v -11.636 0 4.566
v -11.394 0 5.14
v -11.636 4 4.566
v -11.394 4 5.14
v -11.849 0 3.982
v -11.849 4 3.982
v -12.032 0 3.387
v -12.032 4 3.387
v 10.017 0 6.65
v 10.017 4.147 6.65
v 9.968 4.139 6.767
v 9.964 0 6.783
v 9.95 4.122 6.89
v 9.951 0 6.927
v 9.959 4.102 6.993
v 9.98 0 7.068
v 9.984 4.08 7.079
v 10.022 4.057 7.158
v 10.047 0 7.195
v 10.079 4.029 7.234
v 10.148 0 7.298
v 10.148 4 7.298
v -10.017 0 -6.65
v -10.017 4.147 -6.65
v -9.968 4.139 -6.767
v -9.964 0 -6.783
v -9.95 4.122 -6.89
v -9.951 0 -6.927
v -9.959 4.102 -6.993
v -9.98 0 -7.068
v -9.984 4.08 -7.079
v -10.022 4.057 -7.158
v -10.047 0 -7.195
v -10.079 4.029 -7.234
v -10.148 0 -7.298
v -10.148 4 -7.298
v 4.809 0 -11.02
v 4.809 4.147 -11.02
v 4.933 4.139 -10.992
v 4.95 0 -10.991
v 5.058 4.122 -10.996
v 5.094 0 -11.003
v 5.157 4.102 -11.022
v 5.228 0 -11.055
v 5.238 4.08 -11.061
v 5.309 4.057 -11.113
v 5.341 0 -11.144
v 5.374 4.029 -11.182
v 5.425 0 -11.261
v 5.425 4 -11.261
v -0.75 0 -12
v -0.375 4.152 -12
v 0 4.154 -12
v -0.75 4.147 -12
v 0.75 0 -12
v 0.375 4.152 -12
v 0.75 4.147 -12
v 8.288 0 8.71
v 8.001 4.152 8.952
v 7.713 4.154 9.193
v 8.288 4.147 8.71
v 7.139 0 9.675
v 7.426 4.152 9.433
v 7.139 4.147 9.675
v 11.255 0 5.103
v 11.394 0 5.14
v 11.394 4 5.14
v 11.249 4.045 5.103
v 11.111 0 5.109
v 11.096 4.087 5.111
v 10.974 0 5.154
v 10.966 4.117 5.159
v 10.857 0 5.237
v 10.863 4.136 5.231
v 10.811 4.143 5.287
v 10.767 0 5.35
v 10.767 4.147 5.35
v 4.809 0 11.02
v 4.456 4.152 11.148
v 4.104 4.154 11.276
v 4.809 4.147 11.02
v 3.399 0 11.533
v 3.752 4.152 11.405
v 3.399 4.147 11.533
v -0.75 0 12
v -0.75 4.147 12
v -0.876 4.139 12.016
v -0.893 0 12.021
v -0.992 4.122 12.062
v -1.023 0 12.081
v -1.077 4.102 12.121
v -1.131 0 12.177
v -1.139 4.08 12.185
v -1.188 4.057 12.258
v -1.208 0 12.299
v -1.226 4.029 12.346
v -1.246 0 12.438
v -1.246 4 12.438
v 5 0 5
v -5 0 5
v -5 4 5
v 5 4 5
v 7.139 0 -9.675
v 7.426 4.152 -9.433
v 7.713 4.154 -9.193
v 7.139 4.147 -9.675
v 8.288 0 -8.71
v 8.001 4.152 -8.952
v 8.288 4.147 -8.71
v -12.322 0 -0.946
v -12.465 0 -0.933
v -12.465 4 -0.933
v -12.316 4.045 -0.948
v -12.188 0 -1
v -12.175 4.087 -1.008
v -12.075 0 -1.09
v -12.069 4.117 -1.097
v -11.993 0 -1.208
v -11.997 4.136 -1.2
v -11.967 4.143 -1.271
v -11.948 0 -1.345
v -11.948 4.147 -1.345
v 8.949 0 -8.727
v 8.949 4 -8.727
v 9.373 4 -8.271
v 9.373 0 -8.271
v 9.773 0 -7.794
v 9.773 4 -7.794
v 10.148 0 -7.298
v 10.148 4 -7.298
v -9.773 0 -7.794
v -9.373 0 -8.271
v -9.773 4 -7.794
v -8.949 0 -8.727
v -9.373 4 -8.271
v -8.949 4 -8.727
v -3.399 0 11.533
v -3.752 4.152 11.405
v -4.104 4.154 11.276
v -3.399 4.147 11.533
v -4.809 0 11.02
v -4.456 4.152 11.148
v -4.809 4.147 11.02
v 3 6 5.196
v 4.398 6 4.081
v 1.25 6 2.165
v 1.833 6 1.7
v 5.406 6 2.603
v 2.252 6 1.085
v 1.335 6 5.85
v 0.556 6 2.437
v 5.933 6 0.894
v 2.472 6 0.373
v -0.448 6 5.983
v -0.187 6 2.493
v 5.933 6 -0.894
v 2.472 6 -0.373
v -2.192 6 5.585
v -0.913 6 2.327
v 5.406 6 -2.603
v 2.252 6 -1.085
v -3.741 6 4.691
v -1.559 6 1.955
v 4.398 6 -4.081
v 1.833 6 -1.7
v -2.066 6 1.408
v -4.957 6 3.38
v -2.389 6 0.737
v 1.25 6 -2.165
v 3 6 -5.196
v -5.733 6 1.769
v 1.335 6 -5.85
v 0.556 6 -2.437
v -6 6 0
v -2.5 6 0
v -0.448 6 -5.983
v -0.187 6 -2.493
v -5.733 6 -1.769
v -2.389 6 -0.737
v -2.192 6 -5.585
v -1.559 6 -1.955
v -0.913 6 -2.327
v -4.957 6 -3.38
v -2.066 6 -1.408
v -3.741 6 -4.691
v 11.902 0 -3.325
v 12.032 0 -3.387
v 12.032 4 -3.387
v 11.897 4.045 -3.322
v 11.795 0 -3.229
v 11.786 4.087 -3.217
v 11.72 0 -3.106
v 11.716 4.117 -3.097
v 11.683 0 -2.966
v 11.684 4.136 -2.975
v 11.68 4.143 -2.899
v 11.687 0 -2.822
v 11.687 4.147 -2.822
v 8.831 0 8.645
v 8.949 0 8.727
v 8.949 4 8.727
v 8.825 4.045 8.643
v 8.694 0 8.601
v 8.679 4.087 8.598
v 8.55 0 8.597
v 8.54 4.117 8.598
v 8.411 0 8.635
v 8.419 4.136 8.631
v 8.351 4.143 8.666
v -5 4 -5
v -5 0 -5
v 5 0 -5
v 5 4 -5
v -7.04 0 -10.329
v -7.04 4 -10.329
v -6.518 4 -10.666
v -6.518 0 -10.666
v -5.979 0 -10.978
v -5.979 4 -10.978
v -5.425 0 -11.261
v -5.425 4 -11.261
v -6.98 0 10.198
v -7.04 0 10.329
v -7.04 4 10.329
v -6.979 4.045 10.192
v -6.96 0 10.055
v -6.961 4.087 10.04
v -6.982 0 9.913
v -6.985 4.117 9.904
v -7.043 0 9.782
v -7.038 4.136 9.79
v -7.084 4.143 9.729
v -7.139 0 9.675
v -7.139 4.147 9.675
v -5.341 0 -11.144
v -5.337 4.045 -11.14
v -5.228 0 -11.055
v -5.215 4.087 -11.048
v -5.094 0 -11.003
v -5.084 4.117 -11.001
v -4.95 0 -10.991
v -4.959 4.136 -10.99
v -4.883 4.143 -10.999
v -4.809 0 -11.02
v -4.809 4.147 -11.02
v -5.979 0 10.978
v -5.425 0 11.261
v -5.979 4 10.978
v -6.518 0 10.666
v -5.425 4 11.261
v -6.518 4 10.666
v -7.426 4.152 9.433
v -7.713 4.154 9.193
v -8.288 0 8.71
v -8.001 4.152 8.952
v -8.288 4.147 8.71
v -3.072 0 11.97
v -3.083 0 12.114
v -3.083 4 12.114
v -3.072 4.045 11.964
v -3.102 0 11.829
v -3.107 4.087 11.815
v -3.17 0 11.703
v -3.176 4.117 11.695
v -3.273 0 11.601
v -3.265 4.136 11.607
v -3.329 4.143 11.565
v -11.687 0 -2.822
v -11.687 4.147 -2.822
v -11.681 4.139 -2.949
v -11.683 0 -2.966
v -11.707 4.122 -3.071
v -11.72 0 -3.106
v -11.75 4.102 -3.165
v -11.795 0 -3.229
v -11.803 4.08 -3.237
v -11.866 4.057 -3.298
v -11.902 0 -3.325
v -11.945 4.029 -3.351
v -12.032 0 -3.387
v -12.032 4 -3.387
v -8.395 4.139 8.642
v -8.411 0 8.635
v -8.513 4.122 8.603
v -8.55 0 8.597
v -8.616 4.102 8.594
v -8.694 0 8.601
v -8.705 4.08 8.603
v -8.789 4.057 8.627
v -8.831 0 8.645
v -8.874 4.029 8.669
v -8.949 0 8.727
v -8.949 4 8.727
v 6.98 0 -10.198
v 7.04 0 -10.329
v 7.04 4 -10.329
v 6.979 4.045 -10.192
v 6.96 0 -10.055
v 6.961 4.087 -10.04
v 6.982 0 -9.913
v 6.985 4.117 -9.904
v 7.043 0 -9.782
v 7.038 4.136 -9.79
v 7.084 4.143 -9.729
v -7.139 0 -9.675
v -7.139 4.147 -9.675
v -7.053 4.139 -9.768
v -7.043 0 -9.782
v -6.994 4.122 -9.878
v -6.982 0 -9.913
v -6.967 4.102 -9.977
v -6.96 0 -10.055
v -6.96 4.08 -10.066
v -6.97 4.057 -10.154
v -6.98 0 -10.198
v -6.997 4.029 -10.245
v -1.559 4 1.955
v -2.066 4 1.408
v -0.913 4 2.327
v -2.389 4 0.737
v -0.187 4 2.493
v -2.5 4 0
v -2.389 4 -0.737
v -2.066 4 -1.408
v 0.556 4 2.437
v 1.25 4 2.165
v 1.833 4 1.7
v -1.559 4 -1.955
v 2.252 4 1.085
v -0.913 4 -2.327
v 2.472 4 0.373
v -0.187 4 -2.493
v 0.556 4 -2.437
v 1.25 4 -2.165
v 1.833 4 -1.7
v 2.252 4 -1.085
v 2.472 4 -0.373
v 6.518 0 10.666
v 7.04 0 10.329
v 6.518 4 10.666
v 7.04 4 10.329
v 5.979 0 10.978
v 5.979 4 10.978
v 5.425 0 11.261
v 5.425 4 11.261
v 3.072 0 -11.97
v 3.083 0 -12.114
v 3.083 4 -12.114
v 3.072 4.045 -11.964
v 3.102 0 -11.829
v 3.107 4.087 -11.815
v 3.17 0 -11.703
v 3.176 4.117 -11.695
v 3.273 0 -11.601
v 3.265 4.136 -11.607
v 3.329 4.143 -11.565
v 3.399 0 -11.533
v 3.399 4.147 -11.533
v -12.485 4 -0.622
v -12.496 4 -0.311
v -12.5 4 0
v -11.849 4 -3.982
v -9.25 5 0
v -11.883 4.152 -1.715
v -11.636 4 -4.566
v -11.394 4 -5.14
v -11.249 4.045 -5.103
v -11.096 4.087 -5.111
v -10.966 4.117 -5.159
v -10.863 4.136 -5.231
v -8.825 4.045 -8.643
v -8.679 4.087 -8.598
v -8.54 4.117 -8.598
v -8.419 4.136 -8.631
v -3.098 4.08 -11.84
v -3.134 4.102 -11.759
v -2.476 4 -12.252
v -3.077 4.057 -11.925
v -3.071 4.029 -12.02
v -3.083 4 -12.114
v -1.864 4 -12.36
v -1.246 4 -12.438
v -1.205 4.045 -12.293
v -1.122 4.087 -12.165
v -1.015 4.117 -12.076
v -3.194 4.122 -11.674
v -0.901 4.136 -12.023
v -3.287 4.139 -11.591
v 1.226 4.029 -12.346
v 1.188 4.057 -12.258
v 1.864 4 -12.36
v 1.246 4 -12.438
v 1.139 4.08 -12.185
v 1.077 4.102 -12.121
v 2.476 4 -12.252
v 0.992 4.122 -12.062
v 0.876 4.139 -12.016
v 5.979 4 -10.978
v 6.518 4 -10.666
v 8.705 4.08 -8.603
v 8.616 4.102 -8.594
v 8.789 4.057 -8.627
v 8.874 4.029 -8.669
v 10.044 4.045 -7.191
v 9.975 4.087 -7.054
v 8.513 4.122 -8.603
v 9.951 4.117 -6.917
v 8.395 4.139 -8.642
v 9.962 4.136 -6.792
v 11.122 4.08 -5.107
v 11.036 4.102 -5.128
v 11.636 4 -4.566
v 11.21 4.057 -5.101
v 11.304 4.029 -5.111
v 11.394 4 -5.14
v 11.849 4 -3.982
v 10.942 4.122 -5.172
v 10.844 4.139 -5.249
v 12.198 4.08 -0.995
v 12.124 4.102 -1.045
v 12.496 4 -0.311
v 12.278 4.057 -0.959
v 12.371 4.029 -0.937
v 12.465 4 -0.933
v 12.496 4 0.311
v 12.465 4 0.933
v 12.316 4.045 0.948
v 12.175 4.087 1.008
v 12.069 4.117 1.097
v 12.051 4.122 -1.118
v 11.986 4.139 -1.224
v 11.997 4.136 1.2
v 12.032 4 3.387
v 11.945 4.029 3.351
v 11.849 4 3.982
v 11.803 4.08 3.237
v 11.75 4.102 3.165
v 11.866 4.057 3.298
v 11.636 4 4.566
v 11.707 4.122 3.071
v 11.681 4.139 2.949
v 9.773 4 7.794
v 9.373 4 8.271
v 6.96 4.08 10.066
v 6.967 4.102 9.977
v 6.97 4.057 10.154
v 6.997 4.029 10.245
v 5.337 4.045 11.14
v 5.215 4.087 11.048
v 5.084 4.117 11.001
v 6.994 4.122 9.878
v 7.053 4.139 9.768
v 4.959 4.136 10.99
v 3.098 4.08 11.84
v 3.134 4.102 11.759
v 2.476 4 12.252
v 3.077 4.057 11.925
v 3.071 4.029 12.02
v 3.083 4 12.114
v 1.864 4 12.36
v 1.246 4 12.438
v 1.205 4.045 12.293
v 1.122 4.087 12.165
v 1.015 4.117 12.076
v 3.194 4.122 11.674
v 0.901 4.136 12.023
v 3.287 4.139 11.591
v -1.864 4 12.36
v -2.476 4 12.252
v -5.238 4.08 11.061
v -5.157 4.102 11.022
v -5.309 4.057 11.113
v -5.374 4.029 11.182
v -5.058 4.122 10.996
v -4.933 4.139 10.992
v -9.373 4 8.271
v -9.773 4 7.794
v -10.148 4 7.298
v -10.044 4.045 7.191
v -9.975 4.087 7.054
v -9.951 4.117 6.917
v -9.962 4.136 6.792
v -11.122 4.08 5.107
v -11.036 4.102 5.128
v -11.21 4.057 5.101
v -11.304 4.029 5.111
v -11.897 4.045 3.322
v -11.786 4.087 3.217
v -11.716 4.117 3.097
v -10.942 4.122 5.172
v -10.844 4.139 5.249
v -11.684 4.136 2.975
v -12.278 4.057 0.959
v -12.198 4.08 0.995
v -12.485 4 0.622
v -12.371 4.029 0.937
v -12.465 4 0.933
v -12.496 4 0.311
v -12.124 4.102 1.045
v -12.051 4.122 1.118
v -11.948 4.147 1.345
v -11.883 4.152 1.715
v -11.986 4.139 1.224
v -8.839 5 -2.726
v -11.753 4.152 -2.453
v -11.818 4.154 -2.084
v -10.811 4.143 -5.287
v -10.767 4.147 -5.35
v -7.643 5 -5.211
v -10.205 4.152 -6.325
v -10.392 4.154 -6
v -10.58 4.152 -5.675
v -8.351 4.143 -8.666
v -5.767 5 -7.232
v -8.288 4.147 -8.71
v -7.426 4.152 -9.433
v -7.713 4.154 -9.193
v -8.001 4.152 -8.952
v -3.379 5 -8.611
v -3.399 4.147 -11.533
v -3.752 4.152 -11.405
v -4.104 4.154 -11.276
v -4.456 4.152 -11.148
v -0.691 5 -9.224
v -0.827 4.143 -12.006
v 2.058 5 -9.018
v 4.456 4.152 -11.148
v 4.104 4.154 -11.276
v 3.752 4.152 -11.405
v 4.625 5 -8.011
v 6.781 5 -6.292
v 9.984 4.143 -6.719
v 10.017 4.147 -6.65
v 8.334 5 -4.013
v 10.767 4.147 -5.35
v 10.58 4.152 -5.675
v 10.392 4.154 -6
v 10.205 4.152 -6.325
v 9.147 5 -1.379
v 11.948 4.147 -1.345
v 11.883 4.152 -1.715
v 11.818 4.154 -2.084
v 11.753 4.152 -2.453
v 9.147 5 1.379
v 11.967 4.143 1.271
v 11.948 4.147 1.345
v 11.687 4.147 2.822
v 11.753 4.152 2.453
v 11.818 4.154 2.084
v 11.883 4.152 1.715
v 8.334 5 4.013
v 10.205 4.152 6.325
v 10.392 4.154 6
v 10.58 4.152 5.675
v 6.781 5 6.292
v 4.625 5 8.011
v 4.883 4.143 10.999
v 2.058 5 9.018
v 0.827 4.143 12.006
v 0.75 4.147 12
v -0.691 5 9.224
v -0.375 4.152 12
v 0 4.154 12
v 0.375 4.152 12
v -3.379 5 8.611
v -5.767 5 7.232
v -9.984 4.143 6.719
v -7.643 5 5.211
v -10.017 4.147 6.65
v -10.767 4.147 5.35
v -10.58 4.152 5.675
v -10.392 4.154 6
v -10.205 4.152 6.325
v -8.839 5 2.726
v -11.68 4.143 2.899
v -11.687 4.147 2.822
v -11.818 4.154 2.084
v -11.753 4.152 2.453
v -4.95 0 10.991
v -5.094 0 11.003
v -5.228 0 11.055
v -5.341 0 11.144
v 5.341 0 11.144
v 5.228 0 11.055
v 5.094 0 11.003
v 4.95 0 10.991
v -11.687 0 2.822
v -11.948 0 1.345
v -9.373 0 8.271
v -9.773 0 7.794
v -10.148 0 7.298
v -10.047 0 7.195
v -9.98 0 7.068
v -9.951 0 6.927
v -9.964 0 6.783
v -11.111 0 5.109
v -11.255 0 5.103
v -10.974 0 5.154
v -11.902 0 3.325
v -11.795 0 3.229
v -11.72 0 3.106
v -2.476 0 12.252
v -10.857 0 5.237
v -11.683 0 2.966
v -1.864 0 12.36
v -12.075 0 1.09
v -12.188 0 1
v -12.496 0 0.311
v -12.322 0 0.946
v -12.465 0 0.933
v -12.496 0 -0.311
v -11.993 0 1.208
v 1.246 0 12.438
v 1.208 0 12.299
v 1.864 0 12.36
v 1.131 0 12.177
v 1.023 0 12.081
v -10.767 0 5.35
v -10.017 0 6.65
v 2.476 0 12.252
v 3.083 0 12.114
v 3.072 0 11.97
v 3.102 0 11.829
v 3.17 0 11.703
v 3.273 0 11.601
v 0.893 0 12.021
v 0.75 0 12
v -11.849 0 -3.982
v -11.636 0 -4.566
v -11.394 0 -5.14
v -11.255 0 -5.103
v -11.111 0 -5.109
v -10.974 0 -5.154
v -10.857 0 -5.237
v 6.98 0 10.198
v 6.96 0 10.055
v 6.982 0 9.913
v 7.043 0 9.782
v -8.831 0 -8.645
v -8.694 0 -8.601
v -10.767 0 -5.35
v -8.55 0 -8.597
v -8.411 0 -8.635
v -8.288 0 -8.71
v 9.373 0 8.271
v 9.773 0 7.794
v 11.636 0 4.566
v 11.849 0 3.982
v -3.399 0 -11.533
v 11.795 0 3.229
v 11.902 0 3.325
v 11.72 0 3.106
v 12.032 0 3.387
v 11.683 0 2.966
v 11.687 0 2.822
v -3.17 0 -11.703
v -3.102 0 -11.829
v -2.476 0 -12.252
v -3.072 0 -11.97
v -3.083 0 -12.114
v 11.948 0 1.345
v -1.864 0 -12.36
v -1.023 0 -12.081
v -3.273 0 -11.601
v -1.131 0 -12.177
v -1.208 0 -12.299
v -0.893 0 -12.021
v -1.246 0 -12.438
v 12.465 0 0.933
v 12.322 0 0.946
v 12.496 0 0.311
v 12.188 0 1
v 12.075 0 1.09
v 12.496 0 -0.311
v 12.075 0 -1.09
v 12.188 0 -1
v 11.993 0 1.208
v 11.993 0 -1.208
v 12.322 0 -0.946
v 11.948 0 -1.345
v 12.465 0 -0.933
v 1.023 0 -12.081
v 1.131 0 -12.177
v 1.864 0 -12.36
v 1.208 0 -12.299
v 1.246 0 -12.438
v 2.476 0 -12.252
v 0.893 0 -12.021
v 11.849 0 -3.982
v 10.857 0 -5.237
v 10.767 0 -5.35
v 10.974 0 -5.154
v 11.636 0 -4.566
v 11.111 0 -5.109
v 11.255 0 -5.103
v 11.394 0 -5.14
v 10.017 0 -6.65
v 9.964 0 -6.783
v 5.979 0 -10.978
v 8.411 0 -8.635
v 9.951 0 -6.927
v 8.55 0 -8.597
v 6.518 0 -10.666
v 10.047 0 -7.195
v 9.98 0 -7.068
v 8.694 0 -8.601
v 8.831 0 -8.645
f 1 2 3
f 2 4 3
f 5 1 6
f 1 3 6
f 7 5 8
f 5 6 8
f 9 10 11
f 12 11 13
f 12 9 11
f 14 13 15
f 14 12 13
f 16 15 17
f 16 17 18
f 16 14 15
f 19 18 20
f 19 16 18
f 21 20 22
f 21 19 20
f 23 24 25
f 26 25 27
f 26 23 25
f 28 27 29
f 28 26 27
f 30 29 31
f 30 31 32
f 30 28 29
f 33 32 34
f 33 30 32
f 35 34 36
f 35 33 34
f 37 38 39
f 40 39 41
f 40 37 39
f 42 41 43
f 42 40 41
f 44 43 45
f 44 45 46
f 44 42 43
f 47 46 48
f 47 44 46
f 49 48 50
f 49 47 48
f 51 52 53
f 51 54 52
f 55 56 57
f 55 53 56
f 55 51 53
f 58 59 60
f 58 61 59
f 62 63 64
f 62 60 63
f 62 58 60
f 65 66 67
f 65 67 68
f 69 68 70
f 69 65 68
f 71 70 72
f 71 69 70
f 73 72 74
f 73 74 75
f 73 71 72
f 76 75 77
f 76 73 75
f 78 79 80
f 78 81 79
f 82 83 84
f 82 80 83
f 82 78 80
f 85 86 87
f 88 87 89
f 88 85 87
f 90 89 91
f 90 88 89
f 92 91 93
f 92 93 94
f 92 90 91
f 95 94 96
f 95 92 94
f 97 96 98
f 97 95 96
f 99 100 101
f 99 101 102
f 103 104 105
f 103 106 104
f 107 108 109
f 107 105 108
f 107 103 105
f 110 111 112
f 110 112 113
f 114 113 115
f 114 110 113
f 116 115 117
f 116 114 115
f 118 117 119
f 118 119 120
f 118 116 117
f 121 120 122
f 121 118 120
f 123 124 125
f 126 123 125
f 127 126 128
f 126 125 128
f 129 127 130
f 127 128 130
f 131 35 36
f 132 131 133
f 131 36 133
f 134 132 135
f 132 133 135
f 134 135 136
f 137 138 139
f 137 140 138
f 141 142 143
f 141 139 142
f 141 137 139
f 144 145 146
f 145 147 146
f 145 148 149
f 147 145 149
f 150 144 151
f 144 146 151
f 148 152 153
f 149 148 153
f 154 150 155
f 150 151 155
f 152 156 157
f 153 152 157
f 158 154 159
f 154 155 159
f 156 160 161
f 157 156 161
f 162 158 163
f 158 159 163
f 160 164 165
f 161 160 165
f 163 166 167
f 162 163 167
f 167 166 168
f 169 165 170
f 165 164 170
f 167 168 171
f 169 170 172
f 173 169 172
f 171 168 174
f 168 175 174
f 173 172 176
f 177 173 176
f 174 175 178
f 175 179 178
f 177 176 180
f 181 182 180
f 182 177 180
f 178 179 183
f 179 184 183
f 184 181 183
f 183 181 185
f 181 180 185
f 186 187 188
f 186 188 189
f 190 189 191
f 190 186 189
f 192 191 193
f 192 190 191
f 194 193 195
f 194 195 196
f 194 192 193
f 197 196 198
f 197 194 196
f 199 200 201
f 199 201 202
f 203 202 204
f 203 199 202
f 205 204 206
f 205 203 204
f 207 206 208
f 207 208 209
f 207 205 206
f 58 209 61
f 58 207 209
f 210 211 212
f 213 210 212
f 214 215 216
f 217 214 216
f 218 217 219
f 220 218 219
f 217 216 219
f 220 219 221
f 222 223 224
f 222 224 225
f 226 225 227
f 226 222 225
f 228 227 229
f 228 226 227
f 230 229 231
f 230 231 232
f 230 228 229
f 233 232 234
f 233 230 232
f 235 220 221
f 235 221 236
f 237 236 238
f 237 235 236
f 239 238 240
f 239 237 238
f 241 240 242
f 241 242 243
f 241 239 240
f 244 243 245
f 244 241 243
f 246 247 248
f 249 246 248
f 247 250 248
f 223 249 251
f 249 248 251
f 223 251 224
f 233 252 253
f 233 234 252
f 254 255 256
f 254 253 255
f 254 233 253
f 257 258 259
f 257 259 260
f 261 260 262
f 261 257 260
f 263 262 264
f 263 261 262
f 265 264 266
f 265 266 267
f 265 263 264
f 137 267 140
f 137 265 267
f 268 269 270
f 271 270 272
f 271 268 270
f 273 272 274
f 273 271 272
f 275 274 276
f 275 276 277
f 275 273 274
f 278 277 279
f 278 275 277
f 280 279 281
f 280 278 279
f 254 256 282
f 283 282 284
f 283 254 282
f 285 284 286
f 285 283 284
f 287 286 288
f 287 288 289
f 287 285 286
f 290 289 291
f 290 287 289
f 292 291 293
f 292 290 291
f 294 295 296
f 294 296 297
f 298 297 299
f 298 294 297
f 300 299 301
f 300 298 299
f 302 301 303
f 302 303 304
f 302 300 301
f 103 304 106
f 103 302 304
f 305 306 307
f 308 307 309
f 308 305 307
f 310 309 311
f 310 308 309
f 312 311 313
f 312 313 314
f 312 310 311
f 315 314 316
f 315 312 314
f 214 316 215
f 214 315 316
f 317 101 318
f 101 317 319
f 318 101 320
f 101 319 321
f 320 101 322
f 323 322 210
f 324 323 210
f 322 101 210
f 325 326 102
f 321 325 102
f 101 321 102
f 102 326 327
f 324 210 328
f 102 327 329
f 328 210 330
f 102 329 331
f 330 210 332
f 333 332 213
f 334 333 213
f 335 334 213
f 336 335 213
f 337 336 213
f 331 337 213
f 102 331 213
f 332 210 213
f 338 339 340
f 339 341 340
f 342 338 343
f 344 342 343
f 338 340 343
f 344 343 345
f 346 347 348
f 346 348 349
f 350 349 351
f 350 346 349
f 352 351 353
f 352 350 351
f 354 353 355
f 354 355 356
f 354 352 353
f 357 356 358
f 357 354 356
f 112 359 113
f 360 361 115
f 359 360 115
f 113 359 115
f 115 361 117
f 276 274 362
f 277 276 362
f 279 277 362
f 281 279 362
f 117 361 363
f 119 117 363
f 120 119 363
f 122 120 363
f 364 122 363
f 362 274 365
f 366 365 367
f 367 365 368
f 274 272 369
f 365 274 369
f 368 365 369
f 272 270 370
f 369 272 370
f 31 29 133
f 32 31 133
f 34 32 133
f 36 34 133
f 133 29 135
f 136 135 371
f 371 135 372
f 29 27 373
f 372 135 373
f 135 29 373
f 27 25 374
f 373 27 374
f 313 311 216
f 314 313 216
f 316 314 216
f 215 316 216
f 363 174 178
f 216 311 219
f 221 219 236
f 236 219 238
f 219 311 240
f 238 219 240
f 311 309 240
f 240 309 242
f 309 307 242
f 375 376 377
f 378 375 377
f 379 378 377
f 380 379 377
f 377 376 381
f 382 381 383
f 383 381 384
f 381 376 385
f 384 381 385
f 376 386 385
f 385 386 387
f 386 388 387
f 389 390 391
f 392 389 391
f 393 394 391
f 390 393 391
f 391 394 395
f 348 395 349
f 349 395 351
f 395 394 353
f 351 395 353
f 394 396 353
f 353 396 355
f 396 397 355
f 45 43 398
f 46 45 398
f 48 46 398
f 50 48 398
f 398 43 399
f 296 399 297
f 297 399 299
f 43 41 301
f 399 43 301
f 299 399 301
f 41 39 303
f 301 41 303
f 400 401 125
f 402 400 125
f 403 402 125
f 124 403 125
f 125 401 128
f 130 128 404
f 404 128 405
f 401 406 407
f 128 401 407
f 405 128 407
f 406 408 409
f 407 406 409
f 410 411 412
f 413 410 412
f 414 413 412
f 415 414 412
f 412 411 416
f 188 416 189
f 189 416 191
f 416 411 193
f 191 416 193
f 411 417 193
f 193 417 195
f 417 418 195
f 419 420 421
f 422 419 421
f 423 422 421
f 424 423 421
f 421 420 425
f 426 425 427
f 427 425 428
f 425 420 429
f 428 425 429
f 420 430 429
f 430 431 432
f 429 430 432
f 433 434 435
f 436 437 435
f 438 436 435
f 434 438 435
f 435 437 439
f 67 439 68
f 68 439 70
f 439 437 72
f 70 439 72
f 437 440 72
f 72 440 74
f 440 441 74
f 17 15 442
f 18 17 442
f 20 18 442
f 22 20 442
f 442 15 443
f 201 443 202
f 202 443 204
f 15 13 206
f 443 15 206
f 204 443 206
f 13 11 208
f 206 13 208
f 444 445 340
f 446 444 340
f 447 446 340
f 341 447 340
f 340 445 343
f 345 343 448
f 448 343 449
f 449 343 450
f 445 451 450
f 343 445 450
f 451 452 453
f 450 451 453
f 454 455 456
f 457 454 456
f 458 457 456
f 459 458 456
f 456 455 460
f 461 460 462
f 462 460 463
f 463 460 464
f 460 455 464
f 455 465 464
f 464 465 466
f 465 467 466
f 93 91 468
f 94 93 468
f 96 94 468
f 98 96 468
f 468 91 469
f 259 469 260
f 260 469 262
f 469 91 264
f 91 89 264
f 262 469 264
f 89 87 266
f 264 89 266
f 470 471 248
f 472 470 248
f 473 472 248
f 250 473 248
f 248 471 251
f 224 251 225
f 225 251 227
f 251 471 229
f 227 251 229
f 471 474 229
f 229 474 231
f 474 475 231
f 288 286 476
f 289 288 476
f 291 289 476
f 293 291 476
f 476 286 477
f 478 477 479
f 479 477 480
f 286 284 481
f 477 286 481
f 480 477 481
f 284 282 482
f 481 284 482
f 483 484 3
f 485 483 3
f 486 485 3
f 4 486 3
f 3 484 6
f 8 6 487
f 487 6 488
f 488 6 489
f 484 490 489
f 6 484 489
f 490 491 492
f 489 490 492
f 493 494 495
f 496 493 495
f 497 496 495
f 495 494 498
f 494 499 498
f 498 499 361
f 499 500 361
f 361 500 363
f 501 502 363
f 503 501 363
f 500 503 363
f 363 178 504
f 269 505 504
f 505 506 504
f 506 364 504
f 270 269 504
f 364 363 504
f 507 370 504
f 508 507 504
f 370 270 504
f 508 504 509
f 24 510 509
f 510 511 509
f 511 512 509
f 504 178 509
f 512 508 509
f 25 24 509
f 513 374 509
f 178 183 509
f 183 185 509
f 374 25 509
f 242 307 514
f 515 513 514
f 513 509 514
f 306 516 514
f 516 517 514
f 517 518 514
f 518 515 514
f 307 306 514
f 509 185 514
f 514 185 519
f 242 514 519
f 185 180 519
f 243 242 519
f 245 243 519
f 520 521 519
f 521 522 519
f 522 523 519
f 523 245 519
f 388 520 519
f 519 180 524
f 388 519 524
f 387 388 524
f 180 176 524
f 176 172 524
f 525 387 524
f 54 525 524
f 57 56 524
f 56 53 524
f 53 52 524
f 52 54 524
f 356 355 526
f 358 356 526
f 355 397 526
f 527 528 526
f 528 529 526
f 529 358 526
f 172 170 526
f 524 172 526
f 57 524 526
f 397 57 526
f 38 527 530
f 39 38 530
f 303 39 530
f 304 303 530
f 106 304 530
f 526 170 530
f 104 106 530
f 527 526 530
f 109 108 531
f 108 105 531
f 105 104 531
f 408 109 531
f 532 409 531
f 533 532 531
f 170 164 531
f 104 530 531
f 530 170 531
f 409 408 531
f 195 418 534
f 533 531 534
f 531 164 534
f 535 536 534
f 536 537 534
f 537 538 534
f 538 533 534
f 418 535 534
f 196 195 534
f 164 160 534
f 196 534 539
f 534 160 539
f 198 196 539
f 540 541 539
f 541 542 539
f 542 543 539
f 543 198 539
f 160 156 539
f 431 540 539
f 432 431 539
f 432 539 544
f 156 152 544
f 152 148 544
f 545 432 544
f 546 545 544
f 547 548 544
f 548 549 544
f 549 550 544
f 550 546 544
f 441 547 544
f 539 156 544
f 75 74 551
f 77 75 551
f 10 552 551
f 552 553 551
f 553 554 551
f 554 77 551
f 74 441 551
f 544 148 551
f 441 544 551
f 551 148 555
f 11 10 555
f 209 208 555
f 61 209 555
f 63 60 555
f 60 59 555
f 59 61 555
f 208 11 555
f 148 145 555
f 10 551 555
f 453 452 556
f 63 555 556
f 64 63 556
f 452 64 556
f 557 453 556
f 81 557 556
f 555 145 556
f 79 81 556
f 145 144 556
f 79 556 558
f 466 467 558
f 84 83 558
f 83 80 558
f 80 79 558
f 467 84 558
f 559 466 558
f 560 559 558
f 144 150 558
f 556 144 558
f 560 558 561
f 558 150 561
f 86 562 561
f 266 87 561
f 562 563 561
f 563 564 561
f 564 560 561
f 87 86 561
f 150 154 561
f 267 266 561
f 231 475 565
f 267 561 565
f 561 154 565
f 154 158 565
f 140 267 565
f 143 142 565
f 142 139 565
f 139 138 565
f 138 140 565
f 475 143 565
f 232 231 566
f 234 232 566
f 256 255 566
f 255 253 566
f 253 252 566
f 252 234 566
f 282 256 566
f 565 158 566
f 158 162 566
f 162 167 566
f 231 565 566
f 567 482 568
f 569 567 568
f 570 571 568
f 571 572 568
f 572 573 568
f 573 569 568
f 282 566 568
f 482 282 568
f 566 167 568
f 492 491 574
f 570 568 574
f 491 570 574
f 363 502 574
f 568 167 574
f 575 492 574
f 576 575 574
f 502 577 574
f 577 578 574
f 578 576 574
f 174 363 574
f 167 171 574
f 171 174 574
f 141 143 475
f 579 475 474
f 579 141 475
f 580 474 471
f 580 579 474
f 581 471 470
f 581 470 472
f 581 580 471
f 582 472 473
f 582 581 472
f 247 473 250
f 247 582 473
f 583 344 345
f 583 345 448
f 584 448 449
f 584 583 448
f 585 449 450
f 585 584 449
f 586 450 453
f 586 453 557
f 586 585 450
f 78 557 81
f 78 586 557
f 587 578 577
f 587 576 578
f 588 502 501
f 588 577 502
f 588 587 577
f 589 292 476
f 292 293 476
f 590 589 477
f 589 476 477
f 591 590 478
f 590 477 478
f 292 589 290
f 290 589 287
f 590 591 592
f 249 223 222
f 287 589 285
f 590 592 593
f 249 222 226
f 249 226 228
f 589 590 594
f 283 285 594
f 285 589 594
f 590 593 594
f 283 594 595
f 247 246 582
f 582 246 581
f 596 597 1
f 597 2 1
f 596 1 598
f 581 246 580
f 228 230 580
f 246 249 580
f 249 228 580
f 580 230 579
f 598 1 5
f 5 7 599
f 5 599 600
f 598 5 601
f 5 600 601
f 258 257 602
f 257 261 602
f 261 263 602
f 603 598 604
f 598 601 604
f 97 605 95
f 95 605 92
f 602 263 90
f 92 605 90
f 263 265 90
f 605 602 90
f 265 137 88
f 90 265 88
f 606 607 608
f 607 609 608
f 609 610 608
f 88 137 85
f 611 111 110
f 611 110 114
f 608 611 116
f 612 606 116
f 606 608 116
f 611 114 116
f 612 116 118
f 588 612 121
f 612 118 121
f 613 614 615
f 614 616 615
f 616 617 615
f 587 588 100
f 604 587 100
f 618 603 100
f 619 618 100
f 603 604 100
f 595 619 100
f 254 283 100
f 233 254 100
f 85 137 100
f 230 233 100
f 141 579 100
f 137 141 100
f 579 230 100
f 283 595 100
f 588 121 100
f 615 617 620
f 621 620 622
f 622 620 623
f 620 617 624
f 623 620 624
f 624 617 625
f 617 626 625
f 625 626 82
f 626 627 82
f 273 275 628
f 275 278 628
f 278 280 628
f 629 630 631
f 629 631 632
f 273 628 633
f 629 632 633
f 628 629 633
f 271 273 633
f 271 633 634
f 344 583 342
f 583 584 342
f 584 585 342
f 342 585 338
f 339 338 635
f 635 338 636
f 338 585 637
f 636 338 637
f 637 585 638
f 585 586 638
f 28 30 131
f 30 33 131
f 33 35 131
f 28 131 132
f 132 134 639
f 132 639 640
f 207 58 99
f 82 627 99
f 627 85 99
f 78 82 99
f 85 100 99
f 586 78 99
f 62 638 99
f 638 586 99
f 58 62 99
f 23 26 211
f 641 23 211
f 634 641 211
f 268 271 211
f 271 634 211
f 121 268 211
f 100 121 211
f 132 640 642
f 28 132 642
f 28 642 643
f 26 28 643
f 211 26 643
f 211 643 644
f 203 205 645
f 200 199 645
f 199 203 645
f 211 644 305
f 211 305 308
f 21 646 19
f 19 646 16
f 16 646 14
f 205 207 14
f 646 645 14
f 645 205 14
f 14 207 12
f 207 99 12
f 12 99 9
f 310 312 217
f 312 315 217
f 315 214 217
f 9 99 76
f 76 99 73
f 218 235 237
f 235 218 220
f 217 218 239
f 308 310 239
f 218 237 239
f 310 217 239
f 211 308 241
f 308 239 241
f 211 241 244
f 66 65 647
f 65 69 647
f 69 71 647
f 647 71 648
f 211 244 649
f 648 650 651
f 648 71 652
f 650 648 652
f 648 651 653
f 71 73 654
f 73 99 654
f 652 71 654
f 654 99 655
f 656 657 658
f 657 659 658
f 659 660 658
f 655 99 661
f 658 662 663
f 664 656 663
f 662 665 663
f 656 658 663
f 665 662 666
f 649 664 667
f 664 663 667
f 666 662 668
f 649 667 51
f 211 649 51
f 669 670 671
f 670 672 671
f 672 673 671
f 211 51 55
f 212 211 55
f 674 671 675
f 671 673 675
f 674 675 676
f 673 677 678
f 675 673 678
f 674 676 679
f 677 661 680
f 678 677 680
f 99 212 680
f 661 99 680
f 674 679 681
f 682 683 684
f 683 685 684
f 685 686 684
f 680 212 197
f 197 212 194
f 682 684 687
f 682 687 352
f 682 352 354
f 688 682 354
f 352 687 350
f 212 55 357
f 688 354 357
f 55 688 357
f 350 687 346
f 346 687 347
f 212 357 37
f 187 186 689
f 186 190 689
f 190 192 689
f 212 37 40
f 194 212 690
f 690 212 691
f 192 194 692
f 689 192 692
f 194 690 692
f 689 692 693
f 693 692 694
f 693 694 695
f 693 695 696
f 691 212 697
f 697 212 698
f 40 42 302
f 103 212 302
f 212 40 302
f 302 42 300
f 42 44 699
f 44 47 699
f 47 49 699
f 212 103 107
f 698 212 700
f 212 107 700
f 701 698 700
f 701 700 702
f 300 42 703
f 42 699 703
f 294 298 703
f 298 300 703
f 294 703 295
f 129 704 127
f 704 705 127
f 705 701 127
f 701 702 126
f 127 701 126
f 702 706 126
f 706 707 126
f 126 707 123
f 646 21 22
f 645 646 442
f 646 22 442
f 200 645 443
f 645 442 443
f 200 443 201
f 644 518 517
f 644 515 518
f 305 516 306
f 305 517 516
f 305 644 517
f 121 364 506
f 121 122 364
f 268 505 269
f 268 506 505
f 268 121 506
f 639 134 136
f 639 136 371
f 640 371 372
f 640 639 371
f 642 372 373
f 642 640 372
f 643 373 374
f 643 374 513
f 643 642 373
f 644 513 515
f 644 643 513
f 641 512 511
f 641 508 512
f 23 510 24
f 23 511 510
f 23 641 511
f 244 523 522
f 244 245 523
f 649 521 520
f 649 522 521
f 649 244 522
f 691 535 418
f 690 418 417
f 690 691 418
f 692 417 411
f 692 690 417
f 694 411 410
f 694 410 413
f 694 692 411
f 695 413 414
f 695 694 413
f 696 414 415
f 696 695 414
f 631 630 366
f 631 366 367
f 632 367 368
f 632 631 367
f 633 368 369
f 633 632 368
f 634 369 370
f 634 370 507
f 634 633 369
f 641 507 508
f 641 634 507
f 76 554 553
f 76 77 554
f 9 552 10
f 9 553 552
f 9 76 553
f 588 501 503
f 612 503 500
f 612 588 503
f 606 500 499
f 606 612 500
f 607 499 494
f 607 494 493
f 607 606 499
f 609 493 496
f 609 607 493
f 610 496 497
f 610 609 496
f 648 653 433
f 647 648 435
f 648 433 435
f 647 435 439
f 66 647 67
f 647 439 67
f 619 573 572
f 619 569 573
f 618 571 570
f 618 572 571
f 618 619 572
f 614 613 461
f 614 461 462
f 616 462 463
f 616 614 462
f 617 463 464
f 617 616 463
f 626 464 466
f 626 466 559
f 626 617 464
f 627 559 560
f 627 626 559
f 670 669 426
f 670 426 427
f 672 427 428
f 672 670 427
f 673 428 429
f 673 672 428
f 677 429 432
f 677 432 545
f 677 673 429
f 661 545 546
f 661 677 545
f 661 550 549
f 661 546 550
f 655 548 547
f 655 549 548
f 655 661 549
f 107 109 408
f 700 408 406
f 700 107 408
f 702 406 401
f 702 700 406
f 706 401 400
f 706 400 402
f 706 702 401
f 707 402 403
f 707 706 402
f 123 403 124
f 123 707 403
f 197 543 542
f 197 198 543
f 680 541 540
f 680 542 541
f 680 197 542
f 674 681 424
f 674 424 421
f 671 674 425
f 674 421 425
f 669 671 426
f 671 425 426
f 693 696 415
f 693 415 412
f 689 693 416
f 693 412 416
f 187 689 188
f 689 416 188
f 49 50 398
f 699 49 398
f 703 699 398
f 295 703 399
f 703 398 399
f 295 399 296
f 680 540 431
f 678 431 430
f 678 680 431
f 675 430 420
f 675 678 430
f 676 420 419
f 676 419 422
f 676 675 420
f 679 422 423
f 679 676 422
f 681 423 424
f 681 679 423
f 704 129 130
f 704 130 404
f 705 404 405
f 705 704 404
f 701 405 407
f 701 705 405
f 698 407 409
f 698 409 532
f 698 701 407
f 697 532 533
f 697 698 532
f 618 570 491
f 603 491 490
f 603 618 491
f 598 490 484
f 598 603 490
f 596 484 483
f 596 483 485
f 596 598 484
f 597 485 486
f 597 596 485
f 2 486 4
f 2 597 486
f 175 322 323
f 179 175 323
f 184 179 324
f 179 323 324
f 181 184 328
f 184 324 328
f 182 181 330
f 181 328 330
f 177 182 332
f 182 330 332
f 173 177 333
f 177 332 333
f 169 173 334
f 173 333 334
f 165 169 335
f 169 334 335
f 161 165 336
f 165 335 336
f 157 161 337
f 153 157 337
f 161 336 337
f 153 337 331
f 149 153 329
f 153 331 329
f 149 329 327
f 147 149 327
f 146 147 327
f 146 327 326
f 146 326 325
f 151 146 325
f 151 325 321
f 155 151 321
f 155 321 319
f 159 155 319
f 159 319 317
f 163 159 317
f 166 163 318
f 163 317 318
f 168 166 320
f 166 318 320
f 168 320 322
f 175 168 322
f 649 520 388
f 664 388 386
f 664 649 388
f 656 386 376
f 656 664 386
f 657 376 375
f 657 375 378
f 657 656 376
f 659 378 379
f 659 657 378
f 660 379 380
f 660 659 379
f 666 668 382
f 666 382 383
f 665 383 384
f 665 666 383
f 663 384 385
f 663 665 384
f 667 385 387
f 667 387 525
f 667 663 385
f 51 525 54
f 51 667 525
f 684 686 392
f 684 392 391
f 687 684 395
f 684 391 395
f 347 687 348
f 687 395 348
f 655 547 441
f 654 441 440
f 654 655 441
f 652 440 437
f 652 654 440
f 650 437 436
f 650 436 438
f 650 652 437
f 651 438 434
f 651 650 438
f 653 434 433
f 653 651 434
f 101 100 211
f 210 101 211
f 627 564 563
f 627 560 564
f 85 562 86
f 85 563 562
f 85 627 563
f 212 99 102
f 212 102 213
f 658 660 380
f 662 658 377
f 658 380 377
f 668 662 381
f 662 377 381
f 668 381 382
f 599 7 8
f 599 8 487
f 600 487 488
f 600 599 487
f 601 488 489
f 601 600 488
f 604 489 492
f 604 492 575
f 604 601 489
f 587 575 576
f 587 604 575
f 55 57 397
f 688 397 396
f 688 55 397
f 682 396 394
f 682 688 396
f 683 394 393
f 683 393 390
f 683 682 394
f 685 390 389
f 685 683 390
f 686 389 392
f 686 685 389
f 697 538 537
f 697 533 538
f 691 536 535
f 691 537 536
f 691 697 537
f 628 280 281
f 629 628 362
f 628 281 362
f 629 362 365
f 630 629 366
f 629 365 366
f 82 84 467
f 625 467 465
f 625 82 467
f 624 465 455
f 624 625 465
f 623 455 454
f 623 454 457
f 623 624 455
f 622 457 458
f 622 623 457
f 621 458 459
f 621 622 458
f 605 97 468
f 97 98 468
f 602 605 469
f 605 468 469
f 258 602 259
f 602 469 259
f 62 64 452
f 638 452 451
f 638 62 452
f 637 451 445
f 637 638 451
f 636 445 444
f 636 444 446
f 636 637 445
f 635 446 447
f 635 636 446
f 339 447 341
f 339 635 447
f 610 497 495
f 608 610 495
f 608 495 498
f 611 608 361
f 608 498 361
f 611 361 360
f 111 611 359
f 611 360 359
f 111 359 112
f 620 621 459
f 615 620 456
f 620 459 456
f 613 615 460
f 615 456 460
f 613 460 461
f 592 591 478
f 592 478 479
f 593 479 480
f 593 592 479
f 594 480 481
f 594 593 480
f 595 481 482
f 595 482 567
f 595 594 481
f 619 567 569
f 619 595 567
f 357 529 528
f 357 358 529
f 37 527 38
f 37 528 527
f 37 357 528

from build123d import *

# Parameters (mm, degrees)
CUT_EXTRUDE1_DEPTH = 10
SKETCH4_W          = 10
SKETCH4_H          = 10
CUT_EXTRUDE2_DEPTH = 4


with BuildPart() as part:
    # Sketch1 → Revolve1 (revolve)
    with BuildSketch(Plane.XY, mode=Mode.PRIVATE) as revolve1_sk:
        Polygon((2.5, 0), (12.5, 0), (12.5, 4), (6, 6), (2.5, 6), align=None)
    revolve(revolve1_sk.sketch.rotate(Axis((0, 6, 0), (0, -1, 0)), 180), axis=Axis((0, 6, 0), (0, -1, 0)))

    # Sketch2 → Cut-Extrude1 (cut)
    with BuildSketch(Plane.XZ):
        with BuildLine():
            Line((-0.75, 13), (0.75, 13))
            ThreePointArc((0.75, 13), (1.25, 12.5), (0.75, 12))
            Line((0.75, 12), (-0.75, 12))
            ThreePointArc((-0.75, 12), (-1.25, 12.5), (-0.75, 13))
        make_face()
        with BuildLine():
            Line((3.741492398, 12.472519178), (5.151031329, 11.959488963))
            ThreePointArc((5.151031329, 11.959488963), (5.449867568, 11.318632581), (4.809011185, 11.019796342))
            Line((4.809011185, 11.019796342), (3.399472254, 11.532826557))
            ThreePointArc((3.399472254, 11.532826557), (3.100636016, 12.173682939), (3.741492398, 12.472519178))
        make_face()
        with BuildLine():
            Line((7.781705594, 10.440668468), (8.930772258, 9.476487053))
            ThreePointArc((8.930772258, 9.476487053), (8.992400675, 8.772071027), (8.287984649, 8.71044261))
            Line((8.287984649, 8.71044261), (7.138917984, 9.674624025))
            ThreePointArc((7.138917984, 9.674624025), (7.077289567, 10.379040051), (7.781705594, 10.440668468))
        make_face()
        with BuildLine():
            Line((10.883330249, 7.149519053), (11.633330249, 5.850480947))
            ThreePointArc((11.633330249, 5.850480947), (11.450317547, 5.167468245), (10.767304845, 5.350480947))
            Line((10.767304845, 5.350480947), (10.017304845, 6.649519053))
            ThreePointArc((10.017304845, 6.649519053), (10.200317547, 7.332531755), (10.883330249, 7.149519053))
        make_face()
        with BuildLine():
            Line((12.672264656, 2.996032124), (12.932736922, 1.518820495))
            ThreePointArc((12.932736922, 1.518820495), (12.527157135, 0.93959253), (11.947929169, 1.345172317))
            Line((11.947929169, 1.345172317), (11.687456903, 2.822383947))
            ThreePointArc((11.687456903, 2.822383947), (12.093036691, 3.401611912), (12.672264656, 2.996032124))
        make_face()
        with BuildLine():
            Line((12.932736922, -1.518820495), (12.672264656, -2.996032124))
            ThreePointArc((12.672264656, -2.996032124), (12.093036691, -3.401611912), (11.687456903, -2.822383947))
            Line((11.687456903, -2.822383947), (11.947929169, -1.345172317))
            ThreePointArc((11.947929169, -1.345172317), (12.527157135, -0.93959253), (12.932736922, -1.518820495))
        make_face()
        with BuildLine():
            Line((11.633330249, -5.850480947), (10.883330249, -7.149519053))
            ThreePointArc((10.883330249, -7.149519053), (10.200317547, -7.332531755), (10.017304845, -6.649519053))
            Line((10.017304845, -6.649519053), (10.767304845, -5.350480947))
            ThreePointArc((10.767304845, -5.350480947), (11.450317547, -5.167468245), (11.633330249, -5.850480947))
        make_face()
        with BuildLine():
            Line((8.930772258, -9.476487053), (7.781705594, -10.440668468))
            ThreePointArc((7.781705594, -10.440668468), (7.077289567, -10.379040051), (7.138917984, -9.674624025))
            Line((7.138917984, -9.674624025), (8.287984649, -8.71044261))
            ThreePointArc((8.287984649, -8.71044261), (8.992400675, -8.772071027), (8.930772258, -9.476487053))
        make_face()
        with BuildLine():
            Line((5.151031329, -11.959488963), (3.741492398, -12.472519178))
            ThreePointArc((3.741492398, -12.472519178), (3.100636016, -12.173682939), (3.399472254, -11.532826557))
            Line((3.399472254, -11.532826557), (4.809011185, -11.019796342))
            ThreePointArc((4.809011185, -11.019796342), (5.449867568, -11.318632581), (5.151031329, -11.959488963))
        make_face()
        with BuildLine():
            Line((0.75, -13), (-0.75, -13))
            ThreePointArc((-0.75, -13), (-1.25, -12.5), (-0.75, -12))
            Line((-0.75, -12), (0.75, -12))
            ThreePointArc((0.75, -12), (1.25, -12.5), (0.75, -13))
        make_face()
        with BuildLine():
            Line((-3.741492398, -12.472519178), (-5.151031329, -11.959488963))
            ThreePointArc((-5.151031329, -11.959488963), (-5.449867568, -11.318632581), (-4.809011185, -11.019796342))
            Line((-4.809011185, -11.019796342), (-3.399472254, -11.532826557))
            ThreePointArc((-3.399472254, -11.532826557), (-3.100636016, -12.173682939), (-3.741492398, -12.472519178))
        make_face()
        with BuildLine():
            Line((-7.781705594, -10.440668468), (-8.930772258, -9.476487053))
            ThreePointArc((-8.930772258, -9.476487053), (-8.992400675, -8.772071027), (-8.287984649, -8.71044261))
            Line((-8.287984649, -8.71044261), (-7.138917984, -9.674624025))
            ThreePointArc((-7.138917984, -9.674624025), (-7.077289567, -10.379040051), (-7.781705594, -10.440668468))
        make_face()
        with BuildLine():
            Line((-10.883330249, -7.149519053), (-11.633330249, -5.850480947))
            ThreePointArc((-11.633330249, -5.850480947), (-11.450317547, -5.167468245), (-10.767304845, -5.350480947))
            Line((-10.767304845, -5.350480947), (-10.017304845, -6.649519053))
            ThreePointArc((-10.017304845, -6.649519053), (-10.200317547, -7.332531755), (-10.883330249, -7.149519053))
        make_face()
        with BuildLine():
            Line((-12.672264656, -2.996032124), (-12.932736922, -1.518820495))
            ThreePointArc((-12.932736922, -1.518820495), (-12.527157135, -0.93959253), (-11.947929169, -1.345172317))
            Line((-11.947929169, -1.345172317), (-11.687456903, -2.822383947))
            ThreePointArc((-11.687456903, -2.822383947), (-12.093036691, -3.401611912), (-12.672264656, -2.996032124))
        make_face()
        with BuildLine():
            Line((-12.932736922, 1.518820495), (-12.672264656, 2.996032124))
            ThreePointArc((-12.672264656, 2.996032124), (-12.093036691, 3.401611912), (-11.687456903, 2.822383947))
            Line((-11.687456903, 2.822383947), (-11.947929169, 1.345172317))
            ThreePointArc((-11.947929169, 1.345172317), (-12.527157135, 0.93959253), (-12.932736922, 1.518820495))
        make_face()
        with BuildLine():
            Line((-11.633330249, 5.850480947), (-10.883330249, 7.149519053))
            ThreePointArc((-10.883330249, 7.149519053), (-10.200317547, 7.332531755), (-10.017304845, 6.649519053))
            Line((-10.017304845, 6.649519053), (-10.767304845, 5.350480947))
            ThreePointArc((-10.767304845, 5.350480947), (-11.450317547, 5.167468245), (-11.633330249, 5.850480947))
        make_face()
        with BuildLine():
            Line((-8.930772258, 9.476487053), (-7.781705594, 10.440668468))
            ThreePointArc((-7.781705594, 10.440668468), (-7.077289567, 10.379040051), (-7.138917984, 9.674624025))
            Line((-7.138917984, 9.674624025), (-8.287984649, 8.71044261))
            ThreePointArc((-8.287984649, 8.71044261), (-8.992400675, 8.772071027), (-8.930772258, 9.476487053))
        make_face()
        with BuildLine():
            Line((-5.151031329, 11.959488963), (-3.741492398, 12.472519178))
            ThreePointArc((-3.741492398, 12.472519178), (-3.100636016, 12.173682939), (-3.399472254, 11.532826557))
            Line((-3.399472254, 11.532826557), (-4.809011185, 11.019796342))
            ThreePointArc((-4.809011185, 11.019796342), (-5.449867568, 11.318632581), (-5.151031329, 11.959488963))
        make_face()
    extrude(amount=-CUT_EXTRUDE1_DEPTH, mode=Mode.SUBTRACT)

    # Sketch4 → Cut-Extrude2 (cut)
    with BuildSketch(Plane(origin=(0, 0, 0), x_dir=(1, 0, 0), z_dir=(0, 1, 0))):
        Rectangle(SKETCH4_W, SKETCH4_H)
    extrude(amount=CUT_EXTRUDE2_DEPTH, mode=Mode.SUBTRACT)


solid = part.part
